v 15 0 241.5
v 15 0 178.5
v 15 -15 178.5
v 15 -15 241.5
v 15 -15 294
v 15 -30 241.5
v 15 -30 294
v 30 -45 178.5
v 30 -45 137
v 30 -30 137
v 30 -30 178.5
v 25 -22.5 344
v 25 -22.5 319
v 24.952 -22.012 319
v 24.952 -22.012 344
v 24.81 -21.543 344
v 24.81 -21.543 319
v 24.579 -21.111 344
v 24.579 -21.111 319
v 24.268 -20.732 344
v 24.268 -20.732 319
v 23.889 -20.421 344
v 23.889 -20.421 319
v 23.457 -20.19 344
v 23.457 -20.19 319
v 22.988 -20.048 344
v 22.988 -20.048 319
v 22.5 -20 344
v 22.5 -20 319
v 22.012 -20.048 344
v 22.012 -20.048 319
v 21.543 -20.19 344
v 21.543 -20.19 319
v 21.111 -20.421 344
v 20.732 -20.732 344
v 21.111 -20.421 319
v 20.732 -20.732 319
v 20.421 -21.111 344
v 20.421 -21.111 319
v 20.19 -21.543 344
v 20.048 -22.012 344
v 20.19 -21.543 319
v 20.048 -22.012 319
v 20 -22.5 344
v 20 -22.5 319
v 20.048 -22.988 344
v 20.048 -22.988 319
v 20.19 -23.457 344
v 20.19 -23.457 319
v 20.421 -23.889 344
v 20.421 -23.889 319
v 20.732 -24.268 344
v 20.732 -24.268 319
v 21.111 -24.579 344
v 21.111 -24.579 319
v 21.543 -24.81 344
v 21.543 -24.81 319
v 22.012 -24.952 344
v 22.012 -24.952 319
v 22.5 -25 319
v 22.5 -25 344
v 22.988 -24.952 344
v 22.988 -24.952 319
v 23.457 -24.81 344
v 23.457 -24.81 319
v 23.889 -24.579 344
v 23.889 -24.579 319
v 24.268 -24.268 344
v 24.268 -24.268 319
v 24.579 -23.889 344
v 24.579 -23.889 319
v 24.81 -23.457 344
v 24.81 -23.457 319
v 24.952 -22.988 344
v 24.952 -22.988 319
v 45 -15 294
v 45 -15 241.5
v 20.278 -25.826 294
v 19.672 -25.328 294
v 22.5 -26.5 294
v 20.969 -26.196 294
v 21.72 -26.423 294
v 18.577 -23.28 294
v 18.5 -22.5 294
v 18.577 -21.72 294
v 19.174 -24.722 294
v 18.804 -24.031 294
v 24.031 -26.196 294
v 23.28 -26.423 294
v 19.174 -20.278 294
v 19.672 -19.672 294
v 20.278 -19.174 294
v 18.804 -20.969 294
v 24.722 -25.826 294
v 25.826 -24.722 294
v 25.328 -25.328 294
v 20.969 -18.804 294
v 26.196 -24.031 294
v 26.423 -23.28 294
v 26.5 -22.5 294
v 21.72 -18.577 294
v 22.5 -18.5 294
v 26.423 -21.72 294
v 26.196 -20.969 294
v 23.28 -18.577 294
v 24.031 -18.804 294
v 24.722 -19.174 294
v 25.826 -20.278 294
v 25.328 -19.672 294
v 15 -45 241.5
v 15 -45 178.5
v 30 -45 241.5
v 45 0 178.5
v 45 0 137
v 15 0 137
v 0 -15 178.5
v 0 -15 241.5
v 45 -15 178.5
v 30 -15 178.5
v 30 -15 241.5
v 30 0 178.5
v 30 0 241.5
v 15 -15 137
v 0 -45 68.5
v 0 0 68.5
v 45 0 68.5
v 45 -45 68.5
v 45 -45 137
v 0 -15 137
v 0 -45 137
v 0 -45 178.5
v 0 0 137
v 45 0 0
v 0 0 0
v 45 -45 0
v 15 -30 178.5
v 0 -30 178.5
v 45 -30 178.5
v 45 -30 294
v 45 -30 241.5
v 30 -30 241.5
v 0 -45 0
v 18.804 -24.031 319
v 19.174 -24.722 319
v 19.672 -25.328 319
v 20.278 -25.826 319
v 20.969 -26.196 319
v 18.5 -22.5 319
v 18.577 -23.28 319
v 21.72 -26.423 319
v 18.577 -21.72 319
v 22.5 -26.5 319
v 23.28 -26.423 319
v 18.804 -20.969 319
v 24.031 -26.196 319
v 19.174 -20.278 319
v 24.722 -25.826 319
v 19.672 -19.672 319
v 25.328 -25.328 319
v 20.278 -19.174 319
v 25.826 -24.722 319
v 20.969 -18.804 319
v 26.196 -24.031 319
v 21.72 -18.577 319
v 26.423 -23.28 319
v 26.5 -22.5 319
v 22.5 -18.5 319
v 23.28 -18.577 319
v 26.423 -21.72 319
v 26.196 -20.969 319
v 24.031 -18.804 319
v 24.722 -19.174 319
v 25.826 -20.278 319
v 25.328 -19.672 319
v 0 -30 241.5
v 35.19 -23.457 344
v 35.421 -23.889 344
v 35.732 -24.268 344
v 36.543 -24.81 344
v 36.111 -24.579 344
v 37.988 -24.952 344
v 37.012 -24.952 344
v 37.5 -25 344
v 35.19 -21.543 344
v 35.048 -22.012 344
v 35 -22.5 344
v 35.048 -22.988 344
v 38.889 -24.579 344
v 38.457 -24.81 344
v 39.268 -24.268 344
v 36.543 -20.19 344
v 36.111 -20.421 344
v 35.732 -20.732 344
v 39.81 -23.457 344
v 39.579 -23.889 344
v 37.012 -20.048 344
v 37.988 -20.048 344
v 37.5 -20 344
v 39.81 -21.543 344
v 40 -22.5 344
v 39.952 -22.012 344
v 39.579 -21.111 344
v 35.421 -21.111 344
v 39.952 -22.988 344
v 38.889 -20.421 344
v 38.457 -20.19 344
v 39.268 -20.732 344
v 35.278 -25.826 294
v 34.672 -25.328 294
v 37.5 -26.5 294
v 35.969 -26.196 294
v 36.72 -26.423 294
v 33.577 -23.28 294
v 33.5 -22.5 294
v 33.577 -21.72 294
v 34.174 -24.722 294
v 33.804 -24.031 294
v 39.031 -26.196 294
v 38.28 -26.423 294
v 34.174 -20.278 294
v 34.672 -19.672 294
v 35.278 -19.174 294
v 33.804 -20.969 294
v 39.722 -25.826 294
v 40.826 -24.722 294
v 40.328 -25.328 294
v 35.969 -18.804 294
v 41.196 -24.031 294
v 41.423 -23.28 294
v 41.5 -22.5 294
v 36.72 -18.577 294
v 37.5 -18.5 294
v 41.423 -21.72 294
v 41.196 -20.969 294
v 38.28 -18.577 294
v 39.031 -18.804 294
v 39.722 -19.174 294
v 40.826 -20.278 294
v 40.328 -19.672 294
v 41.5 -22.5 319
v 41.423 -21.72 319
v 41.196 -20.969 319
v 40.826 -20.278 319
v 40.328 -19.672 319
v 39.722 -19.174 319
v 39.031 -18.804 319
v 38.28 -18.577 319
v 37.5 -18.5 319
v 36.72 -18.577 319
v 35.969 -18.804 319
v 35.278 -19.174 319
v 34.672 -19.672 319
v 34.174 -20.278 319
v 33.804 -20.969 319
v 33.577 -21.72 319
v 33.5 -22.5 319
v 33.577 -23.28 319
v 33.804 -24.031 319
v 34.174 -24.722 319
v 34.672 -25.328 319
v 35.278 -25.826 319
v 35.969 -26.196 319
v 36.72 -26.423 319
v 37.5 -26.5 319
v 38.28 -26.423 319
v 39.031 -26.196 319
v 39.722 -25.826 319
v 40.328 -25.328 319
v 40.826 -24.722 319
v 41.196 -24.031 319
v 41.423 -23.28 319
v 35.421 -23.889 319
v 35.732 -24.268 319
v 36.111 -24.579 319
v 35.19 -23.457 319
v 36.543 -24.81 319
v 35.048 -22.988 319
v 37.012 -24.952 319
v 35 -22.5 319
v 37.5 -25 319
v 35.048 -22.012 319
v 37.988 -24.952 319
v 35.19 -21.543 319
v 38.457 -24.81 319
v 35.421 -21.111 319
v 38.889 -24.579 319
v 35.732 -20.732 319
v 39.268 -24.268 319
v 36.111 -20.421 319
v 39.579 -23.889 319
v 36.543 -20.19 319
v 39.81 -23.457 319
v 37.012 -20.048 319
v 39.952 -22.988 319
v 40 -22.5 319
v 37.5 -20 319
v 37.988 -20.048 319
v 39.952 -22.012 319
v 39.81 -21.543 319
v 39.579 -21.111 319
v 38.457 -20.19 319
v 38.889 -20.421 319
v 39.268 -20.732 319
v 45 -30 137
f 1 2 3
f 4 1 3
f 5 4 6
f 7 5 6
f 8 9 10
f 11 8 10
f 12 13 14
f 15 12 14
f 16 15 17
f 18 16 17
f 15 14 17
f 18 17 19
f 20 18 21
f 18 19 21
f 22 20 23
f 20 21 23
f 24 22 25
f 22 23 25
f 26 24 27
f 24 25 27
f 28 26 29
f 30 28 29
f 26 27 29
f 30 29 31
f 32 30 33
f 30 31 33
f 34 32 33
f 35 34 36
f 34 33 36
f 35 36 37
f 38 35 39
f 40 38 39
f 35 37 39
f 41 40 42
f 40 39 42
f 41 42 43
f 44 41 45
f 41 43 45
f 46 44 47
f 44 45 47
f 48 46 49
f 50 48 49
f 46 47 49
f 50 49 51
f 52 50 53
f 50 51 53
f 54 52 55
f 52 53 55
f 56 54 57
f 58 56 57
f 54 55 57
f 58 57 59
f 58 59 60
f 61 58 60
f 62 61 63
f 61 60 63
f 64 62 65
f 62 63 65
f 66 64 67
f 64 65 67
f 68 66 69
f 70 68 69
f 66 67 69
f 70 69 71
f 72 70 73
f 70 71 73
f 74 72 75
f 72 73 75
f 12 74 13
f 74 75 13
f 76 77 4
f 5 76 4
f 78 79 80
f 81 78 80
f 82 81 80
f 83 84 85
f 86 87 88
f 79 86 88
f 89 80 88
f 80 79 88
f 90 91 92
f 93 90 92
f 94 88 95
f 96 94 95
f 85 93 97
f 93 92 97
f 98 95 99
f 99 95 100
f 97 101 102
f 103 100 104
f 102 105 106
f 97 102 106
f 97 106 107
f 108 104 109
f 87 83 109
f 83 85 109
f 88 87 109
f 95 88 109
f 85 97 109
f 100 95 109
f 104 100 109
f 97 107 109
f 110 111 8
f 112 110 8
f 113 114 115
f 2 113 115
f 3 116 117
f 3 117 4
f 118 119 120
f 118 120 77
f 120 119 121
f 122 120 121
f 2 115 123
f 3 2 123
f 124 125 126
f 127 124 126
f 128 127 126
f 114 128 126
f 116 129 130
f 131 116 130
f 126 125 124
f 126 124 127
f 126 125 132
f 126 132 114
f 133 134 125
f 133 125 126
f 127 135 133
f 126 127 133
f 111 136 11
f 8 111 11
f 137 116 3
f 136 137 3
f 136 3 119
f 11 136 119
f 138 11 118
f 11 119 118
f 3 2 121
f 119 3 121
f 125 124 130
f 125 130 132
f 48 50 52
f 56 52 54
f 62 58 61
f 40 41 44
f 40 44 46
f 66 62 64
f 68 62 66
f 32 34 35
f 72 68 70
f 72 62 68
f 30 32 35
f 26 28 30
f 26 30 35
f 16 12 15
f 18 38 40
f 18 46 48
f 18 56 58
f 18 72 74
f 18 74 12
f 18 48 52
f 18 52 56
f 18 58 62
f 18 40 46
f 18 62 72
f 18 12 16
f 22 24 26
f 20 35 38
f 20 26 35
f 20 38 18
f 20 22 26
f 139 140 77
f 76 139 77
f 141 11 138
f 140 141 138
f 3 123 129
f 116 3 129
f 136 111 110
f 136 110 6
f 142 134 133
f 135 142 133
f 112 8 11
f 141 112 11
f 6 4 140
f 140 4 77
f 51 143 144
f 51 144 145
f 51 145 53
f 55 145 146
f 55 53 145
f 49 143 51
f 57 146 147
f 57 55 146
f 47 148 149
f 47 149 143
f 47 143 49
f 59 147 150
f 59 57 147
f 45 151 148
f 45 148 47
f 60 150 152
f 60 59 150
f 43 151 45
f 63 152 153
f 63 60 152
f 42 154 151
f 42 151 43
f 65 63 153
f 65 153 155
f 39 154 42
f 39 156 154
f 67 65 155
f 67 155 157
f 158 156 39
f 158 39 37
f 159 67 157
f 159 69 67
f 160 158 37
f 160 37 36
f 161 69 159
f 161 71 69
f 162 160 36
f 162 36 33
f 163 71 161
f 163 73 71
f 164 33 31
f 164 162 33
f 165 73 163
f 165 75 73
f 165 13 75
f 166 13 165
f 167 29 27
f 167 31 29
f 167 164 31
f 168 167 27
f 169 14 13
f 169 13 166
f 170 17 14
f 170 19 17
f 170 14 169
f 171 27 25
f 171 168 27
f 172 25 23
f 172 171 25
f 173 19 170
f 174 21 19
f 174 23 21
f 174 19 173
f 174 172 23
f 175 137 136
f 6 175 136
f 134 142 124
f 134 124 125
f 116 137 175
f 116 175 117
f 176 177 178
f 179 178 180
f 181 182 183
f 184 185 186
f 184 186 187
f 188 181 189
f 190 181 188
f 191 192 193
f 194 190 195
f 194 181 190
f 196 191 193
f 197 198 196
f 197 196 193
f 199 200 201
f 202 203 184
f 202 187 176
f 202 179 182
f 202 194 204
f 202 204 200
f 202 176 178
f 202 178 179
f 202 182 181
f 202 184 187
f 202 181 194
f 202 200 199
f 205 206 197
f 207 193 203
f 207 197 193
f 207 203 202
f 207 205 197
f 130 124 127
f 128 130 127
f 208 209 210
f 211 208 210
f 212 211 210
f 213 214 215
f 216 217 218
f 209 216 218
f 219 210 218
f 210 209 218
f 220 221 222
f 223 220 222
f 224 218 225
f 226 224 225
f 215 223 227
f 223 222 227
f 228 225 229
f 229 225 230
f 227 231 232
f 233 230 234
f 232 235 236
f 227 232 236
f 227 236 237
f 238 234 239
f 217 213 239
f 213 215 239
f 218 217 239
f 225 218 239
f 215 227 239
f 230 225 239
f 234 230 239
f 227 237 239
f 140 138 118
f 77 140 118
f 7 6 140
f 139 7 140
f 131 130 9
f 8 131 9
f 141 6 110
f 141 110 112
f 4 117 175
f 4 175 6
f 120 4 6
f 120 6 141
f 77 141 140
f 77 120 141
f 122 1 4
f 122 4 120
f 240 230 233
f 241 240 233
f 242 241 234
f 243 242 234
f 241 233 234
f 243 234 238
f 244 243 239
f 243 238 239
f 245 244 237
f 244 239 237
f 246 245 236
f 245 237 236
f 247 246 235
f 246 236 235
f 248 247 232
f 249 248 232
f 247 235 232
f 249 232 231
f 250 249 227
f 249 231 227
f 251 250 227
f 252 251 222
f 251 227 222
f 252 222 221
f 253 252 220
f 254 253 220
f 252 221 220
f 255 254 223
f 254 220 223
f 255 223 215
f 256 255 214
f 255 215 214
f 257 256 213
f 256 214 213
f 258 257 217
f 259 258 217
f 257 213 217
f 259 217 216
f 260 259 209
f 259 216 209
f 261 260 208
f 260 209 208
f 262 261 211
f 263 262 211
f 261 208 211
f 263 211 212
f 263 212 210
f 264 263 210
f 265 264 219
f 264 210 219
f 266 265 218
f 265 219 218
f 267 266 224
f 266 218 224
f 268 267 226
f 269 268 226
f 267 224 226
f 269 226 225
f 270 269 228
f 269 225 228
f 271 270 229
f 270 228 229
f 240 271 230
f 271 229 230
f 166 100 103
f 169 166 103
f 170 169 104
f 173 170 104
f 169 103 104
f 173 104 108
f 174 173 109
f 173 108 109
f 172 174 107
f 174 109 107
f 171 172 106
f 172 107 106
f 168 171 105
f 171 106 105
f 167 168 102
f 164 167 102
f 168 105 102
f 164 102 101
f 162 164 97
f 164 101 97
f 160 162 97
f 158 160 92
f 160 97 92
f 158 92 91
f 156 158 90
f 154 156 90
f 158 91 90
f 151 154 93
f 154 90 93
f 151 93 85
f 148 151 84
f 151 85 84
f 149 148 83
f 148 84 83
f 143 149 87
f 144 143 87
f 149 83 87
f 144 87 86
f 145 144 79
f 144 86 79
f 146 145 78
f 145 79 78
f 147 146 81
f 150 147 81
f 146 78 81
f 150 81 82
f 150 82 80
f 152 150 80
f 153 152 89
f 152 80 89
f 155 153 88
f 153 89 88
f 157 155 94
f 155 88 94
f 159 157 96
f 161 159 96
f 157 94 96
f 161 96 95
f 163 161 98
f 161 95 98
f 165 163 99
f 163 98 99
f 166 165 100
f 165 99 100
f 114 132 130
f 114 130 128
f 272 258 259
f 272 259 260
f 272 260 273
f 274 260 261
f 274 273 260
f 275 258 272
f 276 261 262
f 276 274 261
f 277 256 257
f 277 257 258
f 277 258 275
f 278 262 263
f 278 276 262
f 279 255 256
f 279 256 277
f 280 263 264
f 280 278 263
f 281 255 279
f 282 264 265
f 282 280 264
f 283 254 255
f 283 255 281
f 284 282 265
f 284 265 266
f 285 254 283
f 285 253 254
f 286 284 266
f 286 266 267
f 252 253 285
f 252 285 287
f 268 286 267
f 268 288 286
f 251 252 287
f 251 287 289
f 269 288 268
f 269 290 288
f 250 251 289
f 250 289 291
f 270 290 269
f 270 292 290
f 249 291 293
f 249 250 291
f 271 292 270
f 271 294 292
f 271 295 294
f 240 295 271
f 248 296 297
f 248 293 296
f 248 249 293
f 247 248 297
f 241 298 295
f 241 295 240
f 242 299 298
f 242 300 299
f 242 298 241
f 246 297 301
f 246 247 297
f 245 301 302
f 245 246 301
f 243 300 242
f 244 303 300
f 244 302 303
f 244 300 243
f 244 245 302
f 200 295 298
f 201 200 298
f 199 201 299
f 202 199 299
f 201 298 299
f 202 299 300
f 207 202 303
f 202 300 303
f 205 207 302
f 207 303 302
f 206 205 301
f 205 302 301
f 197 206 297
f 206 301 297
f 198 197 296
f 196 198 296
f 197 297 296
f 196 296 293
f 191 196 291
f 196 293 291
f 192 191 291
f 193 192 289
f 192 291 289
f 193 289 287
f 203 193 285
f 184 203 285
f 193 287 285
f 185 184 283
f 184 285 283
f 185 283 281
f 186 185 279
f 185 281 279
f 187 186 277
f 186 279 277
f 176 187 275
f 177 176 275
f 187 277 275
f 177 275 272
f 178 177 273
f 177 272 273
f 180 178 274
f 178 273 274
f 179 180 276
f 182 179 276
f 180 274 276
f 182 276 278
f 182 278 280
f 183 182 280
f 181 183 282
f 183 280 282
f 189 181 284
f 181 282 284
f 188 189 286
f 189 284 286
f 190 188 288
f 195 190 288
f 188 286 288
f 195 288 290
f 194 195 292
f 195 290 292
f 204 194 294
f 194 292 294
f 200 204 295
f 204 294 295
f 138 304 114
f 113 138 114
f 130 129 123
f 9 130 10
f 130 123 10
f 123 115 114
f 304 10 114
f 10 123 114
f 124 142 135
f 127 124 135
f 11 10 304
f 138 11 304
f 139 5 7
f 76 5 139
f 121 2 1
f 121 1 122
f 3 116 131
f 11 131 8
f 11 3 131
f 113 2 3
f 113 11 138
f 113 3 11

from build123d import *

# Parameters (mm, degrees)
F0_W      = 45
F0_H      = 45
F1_DEPTH  = 68.5
F2_DEPTH  = 68.5
F4_DEPTH  = 41.5
F5_W      = 15
F5_H      = 15
F6_DEPTH  = 63
F8_DEPTH  = 52.5
F9_R      = 4
F10_DEPTH = 25
F11_R     = 2.5
F12_DEPTH = 25


with BuildPart() as f1:
    # F0 (on Top) → F1 (new body)
    with BuildSketch(Plane.XY):
        with Locations((22.5, -22.5)):
            Rectangle(F0_W, F0_H)
    extrude(amount=F1_DEPTH)


with BuildPart() as f2:
    # F2 (new): a face of the model
    f2_faces = [f1.part.faces().sort_by_distance(p)[0] for p in [
        (22.5, -22.5, 68.5),
    ]]
    extrude(f2_faces, amount=F2_DEPTH)


with BuildPart() as f4:
    # F3 (on face) → F4 (new body)
    with BuildSketch(Plane.XY.offset(137)):
        Polygon((45, 0), (15, 0), (15, -15), (0, -15), (0, -45), (30, -45), (30, -30), (45, -30), align=None)
    extrude(amount=F4_DEPTH)


with BuildPart() as f6:
    # F5 (on face) → F6 (new body)
    with BuildSketch(Plane.XY.offset(178.5)):
        with Locations((22.5, -7.5)):
            Rectangle(F5_W, F5_H)
        with Locations((22.5, -22.5)):
            Rectangle(F5_W, F5_H)
        with Locations((7.5, -22.5)):
            Rectangle(F5_W, F5_H)
        with Locations((22.5, -37.5)):
            Rectangle(F5_W, F5_H)
        with Locations((37.5, -22.5)):
            Rectangle(F5_W, F5_H)
    extrude(amount=F6_DEPTH)


with BuildPart() as f8:
    # F7 (on face) → F8 (new body)
    with BuildSketch(Plane.XY.offset(241.5)):
        Polygon((45, -30), (45, -15), (30, -15), (15, -15), (15, -30), (30, -30), align=None)
    extrude(amount=F8_DEPTH)


with BuildPart() as f10:
    # F9 (on face) → F10 (new body)
    with BuildSketch(Plane.XY.offset(294)):
        with Locations((22.5, -22.5)):
            Circle(F9_R)
    extrude(amount=F10_DEPTH)

    # F11 (on face) → F12 (join)
    with BuildSketch(Plane.XY.offset(319)):
        with Locations((22.5, -22.5)):
            Circle(F11_R)
    extrude(amount=F12_DEPTH)


with BuildPart() as f10b:
    # F9 (on face) → F10, piece 2 (new body)
    with BuildSketch(Plane.XY.offset(294)):
        with Locations((37.5, -22.5)):
            Circle(F9_R)
    extrude(amount=F10_DEPTH)

    # F11 (on face) → F12, piece 2 (join)
    with BuildSketch(Plane.XY.offset(319)):
        with Locations((37.5, -22.5)):
            Circle(F11_R)
    extrude(amount=F12_DEPTH)


solid = Compound([f1.part, f2.part, f4.part, f6.part, f8.part, f10.part, f10b.part])
